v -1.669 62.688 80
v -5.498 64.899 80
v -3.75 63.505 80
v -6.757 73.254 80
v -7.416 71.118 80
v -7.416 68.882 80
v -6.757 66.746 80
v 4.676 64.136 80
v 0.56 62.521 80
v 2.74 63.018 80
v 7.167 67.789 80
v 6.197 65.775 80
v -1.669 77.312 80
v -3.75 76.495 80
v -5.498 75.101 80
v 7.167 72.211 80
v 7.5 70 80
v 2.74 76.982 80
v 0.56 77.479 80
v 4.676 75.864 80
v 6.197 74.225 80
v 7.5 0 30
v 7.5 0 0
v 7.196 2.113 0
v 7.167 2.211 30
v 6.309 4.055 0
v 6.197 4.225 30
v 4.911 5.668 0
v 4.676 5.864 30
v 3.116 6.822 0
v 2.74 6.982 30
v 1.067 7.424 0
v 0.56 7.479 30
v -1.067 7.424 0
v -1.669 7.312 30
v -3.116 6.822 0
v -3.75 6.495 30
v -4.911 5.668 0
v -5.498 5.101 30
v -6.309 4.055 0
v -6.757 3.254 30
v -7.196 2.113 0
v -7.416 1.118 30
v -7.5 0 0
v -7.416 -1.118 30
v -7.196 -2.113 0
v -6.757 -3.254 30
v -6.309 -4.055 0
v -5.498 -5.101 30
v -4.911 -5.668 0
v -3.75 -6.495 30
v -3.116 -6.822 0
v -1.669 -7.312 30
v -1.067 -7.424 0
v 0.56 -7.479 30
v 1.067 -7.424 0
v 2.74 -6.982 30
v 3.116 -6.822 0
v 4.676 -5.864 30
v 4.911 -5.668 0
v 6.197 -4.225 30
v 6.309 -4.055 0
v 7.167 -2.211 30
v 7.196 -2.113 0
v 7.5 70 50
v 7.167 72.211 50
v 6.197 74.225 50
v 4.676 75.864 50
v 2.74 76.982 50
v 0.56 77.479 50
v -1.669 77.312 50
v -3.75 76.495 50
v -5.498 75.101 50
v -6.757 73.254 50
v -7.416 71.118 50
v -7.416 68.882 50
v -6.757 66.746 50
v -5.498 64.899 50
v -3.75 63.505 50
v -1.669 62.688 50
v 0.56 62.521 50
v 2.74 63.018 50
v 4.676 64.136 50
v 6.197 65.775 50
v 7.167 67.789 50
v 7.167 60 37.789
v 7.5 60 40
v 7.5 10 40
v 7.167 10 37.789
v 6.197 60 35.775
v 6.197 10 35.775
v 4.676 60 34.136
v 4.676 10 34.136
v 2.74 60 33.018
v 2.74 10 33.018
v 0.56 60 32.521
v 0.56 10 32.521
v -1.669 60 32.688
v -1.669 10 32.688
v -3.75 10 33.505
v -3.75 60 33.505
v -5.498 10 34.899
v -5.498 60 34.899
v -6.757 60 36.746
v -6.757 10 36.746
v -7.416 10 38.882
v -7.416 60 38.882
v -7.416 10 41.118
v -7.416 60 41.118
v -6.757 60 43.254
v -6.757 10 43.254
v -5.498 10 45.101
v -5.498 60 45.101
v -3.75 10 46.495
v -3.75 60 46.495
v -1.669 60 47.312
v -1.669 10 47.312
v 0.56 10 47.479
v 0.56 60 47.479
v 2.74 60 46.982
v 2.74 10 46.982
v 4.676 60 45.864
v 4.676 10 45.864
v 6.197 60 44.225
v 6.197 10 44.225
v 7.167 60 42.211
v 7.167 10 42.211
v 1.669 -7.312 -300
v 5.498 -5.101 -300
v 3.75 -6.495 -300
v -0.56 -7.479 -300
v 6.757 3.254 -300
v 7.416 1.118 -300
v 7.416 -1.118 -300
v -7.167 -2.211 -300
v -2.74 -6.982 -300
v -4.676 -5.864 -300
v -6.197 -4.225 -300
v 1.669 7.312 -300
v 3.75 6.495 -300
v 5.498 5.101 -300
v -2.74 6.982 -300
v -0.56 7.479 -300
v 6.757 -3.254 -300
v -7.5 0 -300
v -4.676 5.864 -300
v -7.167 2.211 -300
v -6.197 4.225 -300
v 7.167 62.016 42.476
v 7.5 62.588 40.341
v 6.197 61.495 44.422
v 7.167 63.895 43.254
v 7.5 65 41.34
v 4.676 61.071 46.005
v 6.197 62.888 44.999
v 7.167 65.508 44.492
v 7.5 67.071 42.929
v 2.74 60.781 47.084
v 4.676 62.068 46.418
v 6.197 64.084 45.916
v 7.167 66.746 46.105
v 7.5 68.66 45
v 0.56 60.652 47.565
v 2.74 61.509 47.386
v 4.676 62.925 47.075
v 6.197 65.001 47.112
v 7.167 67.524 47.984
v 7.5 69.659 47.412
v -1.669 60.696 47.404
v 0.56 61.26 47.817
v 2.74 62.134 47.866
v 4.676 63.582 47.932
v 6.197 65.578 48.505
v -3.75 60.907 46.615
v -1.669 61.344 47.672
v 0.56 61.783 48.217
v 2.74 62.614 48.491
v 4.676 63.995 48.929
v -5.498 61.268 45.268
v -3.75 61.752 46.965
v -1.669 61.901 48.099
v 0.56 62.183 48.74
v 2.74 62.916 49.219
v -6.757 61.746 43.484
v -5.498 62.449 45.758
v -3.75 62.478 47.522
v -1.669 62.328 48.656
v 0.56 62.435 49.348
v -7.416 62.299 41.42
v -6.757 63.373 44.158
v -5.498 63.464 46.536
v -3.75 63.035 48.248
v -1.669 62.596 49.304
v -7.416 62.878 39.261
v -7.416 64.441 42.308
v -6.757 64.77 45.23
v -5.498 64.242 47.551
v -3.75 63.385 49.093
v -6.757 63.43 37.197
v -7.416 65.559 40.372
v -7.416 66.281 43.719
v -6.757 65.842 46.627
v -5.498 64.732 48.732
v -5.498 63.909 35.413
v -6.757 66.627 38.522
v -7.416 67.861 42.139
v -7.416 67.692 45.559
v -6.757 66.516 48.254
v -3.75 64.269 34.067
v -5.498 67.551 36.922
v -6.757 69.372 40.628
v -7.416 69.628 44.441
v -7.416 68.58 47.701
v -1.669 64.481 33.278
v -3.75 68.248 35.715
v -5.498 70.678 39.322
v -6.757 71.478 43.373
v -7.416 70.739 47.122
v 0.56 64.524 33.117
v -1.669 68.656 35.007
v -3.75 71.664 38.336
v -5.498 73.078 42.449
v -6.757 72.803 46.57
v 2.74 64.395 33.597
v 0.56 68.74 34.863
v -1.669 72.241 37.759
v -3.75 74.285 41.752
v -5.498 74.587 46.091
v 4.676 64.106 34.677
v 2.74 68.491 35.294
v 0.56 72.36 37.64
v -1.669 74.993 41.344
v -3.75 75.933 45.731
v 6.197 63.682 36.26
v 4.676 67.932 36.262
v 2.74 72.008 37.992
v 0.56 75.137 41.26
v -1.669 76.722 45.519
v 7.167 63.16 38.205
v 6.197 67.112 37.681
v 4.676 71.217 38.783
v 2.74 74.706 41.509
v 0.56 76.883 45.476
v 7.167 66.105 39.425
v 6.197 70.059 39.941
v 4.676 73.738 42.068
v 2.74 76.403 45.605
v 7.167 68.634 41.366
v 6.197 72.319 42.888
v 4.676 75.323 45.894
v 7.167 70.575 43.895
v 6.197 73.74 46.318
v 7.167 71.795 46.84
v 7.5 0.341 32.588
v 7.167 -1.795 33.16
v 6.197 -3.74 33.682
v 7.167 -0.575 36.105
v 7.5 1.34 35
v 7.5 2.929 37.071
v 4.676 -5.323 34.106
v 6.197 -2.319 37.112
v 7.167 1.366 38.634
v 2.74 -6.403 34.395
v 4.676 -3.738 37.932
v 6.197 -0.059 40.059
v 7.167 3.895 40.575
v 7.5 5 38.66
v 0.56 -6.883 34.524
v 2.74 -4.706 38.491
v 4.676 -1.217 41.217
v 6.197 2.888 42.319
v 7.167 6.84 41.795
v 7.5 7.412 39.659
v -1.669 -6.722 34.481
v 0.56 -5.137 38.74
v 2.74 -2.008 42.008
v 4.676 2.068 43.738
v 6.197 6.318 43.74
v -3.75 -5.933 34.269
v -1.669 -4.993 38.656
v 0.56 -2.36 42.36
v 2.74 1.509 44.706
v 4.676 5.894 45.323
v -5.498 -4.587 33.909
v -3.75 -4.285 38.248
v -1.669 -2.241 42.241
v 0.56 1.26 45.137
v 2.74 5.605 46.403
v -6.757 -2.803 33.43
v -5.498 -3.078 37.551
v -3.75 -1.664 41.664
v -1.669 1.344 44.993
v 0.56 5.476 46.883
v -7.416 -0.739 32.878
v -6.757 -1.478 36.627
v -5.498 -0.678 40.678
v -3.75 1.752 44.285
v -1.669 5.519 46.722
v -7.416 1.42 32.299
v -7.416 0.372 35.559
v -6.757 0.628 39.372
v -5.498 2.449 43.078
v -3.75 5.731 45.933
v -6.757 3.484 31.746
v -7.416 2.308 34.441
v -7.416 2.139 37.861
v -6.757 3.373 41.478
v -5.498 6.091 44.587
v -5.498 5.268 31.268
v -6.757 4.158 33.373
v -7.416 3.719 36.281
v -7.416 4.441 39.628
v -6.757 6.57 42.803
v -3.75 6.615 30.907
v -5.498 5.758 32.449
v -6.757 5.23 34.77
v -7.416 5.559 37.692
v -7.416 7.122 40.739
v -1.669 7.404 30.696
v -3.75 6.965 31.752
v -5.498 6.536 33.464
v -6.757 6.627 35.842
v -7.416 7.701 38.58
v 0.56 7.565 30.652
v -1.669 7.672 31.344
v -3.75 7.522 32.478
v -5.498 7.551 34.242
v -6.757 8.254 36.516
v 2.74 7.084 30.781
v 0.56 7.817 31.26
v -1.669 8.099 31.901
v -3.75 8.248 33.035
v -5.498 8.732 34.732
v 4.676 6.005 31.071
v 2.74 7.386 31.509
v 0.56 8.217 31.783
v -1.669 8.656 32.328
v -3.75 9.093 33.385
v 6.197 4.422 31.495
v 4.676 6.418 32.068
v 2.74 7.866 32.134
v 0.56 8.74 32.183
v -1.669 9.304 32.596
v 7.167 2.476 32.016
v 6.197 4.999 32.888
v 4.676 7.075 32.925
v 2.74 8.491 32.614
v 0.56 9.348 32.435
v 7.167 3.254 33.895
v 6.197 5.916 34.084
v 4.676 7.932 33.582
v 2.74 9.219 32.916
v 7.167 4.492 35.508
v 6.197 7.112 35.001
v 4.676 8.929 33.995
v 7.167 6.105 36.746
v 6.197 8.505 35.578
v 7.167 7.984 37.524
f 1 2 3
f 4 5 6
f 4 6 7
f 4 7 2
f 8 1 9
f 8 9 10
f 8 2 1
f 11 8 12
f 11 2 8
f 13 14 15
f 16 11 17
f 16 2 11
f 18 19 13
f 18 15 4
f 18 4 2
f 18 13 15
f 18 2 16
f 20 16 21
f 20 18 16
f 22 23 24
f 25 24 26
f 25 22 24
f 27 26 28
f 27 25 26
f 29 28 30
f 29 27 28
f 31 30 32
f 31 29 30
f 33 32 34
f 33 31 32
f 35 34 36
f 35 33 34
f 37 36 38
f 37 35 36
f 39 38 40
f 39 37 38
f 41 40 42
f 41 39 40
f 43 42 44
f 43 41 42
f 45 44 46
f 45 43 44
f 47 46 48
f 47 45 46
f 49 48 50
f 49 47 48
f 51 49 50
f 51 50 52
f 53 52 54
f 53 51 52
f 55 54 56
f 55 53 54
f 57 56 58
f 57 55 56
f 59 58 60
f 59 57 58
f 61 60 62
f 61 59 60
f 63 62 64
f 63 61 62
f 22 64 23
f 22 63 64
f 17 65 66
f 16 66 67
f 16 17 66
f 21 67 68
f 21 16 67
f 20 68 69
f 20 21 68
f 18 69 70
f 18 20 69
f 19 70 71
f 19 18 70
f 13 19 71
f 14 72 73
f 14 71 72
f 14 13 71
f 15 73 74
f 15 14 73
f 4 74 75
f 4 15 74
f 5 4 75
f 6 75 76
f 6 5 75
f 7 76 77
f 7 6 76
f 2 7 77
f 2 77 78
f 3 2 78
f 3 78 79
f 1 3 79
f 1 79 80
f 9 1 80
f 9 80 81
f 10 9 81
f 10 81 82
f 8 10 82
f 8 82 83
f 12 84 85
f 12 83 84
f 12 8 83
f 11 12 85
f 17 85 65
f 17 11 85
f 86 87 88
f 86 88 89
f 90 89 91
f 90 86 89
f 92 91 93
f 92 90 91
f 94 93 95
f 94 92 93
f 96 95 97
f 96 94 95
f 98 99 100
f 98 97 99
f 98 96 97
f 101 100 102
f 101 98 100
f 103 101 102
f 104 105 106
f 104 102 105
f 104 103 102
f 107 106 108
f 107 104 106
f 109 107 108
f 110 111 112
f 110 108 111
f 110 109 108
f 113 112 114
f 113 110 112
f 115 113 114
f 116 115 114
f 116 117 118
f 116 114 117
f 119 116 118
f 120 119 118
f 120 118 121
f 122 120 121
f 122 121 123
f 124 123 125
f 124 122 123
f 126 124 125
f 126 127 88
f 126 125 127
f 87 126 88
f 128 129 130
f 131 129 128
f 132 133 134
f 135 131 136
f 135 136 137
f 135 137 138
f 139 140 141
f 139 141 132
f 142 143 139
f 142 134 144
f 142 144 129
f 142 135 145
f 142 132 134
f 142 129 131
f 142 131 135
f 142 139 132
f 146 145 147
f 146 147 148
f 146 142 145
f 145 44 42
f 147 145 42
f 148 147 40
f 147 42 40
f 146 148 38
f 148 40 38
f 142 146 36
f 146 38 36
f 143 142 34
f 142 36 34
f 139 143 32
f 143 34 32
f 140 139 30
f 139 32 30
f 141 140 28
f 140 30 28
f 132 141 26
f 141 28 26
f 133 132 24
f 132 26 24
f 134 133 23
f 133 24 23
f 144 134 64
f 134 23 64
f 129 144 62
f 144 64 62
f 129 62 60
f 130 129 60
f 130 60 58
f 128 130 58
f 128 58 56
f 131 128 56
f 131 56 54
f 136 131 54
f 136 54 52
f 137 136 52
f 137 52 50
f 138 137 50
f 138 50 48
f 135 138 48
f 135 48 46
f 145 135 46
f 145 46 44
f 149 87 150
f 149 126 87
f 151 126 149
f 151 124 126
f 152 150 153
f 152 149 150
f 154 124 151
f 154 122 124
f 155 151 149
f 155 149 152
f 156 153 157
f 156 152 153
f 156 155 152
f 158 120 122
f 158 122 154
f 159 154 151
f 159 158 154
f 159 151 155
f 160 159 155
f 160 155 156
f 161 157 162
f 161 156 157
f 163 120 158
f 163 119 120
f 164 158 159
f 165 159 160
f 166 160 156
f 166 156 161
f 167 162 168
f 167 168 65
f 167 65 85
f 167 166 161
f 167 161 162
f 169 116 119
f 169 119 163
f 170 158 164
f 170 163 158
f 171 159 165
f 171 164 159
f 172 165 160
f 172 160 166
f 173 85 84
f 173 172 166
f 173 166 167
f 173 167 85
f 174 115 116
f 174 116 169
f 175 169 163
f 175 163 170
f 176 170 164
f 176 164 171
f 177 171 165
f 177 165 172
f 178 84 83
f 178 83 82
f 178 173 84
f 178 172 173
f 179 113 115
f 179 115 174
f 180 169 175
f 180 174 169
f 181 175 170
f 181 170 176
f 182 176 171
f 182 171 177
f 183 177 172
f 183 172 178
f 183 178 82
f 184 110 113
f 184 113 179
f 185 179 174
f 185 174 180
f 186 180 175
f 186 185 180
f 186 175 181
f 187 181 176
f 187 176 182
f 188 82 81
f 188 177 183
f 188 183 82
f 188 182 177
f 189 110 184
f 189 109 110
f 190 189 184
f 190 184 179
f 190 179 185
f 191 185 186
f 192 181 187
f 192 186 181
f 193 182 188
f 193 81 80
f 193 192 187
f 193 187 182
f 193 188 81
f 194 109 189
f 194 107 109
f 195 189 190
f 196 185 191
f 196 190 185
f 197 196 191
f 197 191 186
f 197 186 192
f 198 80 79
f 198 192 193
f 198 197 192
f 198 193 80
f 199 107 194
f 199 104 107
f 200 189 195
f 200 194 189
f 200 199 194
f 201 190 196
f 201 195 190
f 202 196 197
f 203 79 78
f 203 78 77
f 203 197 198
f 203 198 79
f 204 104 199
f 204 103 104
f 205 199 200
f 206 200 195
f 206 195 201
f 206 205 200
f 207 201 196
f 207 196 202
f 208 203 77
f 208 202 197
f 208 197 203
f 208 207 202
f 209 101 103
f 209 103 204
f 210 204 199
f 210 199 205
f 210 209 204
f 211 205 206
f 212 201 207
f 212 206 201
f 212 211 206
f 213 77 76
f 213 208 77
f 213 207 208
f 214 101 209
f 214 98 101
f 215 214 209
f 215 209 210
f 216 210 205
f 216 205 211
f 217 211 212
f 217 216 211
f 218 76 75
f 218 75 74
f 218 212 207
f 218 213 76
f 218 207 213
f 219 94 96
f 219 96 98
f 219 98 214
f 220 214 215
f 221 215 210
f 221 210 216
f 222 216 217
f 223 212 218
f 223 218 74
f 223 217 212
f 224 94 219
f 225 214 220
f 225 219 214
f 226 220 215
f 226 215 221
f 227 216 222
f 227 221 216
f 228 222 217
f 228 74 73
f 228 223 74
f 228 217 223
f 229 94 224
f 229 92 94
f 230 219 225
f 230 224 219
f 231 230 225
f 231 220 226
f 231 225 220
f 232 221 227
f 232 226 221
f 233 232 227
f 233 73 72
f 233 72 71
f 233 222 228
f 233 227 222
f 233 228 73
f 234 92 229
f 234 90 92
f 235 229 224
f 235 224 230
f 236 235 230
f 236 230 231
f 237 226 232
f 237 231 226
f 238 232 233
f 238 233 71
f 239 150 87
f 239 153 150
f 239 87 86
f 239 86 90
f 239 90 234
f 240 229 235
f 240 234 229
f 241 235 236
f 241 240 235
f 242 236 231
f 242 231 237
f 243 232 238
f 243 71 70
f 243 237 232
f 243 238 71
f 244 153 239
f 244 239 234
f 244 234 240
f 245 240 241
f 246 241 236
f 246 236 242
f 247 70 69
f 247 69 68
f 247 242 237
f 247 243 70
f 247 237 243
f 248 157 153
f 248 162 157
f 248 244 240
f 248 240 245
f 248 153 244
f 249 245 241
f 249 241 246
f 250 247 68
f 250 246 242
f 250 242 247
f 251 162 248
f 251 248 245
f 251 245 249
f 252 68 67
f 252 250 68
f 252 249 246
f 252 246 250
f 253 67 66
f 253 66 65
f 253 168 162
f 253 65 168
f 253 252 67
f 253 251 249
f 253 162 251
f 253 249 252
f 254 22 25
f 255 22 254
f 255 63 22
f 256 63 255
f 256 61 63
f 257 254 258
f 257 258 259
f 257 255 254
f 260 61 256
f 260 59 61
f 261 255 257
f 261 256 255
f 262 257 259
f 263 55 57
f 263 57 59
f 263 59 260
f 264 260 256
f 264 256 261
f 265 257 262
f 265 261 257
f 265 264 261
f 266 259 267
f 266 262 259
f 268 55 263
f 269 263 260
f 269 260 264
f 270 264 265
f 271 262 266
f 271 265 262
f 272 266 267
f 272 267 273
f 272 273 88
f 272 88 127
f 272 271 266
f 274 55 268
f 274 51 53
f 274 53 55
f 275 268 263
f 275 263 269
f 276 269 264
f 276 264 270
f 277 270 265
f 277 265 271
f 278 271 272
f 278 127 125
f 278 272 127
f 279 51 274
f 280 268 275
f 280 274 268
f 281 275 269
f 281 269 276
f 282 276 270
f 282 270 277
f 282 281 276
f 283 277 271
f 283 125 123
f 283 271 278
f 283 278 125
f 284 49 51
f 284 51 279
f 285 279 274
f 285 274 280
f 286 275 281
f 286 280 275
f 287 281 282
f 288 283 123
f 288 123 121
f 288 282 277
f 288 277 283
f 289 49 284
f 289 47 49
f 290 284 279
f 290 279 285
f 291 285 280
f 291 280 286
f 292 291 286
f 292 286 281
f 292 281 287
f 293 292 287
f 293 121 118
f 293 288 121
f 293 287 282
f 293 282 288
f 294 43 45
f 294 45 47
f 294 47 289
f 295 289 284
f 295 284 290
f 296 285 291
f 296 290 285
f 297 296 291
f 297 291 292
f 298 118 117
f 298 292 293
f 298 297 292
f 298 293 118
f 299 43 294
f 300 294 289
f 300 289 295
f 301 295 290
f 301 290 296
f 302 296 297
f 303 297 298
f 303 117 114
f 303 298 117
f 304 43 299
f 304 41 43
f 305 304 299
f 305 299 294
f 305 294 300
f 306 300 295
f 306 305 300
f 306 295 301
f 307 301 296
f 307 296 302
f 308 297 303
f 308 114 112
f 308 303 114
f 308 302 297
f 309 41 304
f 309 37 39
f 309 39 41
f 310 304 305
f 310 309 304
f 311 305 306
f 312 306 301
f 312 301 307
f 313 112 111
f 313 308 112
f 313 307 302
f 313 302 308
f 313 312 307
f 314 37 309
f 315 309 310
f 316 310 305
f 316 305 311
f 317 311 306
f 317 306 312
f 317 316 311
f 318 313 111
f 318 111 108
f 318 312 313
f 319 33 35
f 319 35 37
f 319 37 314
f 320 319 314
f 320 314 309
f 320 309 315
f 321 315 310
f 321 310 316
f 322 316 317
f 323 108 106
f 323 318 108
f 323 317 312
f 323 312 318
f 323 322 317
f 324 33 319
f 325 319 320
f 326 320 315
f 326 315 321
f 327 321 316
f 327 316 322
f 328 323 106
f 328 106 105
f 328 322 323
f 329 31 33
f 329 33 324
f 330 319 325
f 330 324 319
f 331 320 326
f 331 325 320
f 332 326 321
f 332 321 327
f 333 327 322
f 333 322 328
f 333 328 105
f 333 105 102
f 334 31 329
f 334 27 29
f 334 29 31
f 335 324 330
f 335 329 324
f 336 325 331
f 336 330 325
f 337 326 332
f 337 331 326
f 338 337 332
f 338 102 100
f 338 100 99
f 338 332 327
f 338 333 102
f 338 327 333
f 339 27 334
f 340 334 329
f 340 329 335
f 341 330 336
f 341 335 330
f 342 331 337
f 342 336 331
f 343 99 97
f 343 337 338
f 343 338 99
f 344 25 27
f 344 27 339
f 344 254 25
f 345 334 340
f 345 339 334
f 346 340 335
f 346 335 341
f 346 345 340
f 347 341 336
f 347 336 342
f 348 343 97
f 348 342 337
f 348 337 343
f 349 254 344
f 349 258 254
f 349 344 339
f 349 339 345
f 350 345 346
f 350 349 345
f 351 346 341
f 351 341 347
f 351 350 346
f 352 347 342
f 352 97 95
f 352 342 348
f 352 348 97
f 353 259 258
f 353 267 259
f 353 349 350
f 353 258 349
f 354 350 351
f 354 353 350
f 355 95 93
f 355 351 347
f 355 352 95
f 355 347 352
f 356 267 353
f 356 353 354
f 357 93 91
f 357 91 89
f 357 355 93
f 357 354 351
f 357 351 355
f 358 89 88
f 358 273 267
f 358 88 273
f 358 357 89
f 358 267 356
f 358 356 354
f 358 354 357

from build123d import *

# Parameters (mm, degrees)
CROQUIS1_R              = 7.5
CROQUIS2_R              = 7.5
SALIENTE_EXTRUIR1_DEPTH = 300


with BuildPart() as part:
    # Barrer1: sweep along a curve in space
    with BuildLine() as barrer1_path:
        Line((0, 0, 0), (0, 0, 30))
        ThreePointArc((0, 0, 30), (0, 2.928932188, 37.071067812), (0, 10, 40))
        Line((0, 10, 40), (0, 60, 40))
        ThreePointArc((0, 60, 40), (0, 67.071067812, 42.928932188), (0, 70, 50))
        Line((0, 70, 50), (0, 70, 80))
    # Croquis1 → Barrer1 (sweep)
    with BuildSketch(Plane.XY):
        Circle(CROQUIS1_R)
    sweep(path=barrer1_path.line)

    # Croquis2 → Saliente-Extruir1 (add)
    with BuildSketch(Plane(origin=(0, 0, 0), x_dir=(-1, 0, 0), z_dir=(0, 0, -1))):
        Circle(CROQUIS2_R)
    extrude(amount=SALIENTE_EXTRUIR1_DEPTH)


solid = part.part
